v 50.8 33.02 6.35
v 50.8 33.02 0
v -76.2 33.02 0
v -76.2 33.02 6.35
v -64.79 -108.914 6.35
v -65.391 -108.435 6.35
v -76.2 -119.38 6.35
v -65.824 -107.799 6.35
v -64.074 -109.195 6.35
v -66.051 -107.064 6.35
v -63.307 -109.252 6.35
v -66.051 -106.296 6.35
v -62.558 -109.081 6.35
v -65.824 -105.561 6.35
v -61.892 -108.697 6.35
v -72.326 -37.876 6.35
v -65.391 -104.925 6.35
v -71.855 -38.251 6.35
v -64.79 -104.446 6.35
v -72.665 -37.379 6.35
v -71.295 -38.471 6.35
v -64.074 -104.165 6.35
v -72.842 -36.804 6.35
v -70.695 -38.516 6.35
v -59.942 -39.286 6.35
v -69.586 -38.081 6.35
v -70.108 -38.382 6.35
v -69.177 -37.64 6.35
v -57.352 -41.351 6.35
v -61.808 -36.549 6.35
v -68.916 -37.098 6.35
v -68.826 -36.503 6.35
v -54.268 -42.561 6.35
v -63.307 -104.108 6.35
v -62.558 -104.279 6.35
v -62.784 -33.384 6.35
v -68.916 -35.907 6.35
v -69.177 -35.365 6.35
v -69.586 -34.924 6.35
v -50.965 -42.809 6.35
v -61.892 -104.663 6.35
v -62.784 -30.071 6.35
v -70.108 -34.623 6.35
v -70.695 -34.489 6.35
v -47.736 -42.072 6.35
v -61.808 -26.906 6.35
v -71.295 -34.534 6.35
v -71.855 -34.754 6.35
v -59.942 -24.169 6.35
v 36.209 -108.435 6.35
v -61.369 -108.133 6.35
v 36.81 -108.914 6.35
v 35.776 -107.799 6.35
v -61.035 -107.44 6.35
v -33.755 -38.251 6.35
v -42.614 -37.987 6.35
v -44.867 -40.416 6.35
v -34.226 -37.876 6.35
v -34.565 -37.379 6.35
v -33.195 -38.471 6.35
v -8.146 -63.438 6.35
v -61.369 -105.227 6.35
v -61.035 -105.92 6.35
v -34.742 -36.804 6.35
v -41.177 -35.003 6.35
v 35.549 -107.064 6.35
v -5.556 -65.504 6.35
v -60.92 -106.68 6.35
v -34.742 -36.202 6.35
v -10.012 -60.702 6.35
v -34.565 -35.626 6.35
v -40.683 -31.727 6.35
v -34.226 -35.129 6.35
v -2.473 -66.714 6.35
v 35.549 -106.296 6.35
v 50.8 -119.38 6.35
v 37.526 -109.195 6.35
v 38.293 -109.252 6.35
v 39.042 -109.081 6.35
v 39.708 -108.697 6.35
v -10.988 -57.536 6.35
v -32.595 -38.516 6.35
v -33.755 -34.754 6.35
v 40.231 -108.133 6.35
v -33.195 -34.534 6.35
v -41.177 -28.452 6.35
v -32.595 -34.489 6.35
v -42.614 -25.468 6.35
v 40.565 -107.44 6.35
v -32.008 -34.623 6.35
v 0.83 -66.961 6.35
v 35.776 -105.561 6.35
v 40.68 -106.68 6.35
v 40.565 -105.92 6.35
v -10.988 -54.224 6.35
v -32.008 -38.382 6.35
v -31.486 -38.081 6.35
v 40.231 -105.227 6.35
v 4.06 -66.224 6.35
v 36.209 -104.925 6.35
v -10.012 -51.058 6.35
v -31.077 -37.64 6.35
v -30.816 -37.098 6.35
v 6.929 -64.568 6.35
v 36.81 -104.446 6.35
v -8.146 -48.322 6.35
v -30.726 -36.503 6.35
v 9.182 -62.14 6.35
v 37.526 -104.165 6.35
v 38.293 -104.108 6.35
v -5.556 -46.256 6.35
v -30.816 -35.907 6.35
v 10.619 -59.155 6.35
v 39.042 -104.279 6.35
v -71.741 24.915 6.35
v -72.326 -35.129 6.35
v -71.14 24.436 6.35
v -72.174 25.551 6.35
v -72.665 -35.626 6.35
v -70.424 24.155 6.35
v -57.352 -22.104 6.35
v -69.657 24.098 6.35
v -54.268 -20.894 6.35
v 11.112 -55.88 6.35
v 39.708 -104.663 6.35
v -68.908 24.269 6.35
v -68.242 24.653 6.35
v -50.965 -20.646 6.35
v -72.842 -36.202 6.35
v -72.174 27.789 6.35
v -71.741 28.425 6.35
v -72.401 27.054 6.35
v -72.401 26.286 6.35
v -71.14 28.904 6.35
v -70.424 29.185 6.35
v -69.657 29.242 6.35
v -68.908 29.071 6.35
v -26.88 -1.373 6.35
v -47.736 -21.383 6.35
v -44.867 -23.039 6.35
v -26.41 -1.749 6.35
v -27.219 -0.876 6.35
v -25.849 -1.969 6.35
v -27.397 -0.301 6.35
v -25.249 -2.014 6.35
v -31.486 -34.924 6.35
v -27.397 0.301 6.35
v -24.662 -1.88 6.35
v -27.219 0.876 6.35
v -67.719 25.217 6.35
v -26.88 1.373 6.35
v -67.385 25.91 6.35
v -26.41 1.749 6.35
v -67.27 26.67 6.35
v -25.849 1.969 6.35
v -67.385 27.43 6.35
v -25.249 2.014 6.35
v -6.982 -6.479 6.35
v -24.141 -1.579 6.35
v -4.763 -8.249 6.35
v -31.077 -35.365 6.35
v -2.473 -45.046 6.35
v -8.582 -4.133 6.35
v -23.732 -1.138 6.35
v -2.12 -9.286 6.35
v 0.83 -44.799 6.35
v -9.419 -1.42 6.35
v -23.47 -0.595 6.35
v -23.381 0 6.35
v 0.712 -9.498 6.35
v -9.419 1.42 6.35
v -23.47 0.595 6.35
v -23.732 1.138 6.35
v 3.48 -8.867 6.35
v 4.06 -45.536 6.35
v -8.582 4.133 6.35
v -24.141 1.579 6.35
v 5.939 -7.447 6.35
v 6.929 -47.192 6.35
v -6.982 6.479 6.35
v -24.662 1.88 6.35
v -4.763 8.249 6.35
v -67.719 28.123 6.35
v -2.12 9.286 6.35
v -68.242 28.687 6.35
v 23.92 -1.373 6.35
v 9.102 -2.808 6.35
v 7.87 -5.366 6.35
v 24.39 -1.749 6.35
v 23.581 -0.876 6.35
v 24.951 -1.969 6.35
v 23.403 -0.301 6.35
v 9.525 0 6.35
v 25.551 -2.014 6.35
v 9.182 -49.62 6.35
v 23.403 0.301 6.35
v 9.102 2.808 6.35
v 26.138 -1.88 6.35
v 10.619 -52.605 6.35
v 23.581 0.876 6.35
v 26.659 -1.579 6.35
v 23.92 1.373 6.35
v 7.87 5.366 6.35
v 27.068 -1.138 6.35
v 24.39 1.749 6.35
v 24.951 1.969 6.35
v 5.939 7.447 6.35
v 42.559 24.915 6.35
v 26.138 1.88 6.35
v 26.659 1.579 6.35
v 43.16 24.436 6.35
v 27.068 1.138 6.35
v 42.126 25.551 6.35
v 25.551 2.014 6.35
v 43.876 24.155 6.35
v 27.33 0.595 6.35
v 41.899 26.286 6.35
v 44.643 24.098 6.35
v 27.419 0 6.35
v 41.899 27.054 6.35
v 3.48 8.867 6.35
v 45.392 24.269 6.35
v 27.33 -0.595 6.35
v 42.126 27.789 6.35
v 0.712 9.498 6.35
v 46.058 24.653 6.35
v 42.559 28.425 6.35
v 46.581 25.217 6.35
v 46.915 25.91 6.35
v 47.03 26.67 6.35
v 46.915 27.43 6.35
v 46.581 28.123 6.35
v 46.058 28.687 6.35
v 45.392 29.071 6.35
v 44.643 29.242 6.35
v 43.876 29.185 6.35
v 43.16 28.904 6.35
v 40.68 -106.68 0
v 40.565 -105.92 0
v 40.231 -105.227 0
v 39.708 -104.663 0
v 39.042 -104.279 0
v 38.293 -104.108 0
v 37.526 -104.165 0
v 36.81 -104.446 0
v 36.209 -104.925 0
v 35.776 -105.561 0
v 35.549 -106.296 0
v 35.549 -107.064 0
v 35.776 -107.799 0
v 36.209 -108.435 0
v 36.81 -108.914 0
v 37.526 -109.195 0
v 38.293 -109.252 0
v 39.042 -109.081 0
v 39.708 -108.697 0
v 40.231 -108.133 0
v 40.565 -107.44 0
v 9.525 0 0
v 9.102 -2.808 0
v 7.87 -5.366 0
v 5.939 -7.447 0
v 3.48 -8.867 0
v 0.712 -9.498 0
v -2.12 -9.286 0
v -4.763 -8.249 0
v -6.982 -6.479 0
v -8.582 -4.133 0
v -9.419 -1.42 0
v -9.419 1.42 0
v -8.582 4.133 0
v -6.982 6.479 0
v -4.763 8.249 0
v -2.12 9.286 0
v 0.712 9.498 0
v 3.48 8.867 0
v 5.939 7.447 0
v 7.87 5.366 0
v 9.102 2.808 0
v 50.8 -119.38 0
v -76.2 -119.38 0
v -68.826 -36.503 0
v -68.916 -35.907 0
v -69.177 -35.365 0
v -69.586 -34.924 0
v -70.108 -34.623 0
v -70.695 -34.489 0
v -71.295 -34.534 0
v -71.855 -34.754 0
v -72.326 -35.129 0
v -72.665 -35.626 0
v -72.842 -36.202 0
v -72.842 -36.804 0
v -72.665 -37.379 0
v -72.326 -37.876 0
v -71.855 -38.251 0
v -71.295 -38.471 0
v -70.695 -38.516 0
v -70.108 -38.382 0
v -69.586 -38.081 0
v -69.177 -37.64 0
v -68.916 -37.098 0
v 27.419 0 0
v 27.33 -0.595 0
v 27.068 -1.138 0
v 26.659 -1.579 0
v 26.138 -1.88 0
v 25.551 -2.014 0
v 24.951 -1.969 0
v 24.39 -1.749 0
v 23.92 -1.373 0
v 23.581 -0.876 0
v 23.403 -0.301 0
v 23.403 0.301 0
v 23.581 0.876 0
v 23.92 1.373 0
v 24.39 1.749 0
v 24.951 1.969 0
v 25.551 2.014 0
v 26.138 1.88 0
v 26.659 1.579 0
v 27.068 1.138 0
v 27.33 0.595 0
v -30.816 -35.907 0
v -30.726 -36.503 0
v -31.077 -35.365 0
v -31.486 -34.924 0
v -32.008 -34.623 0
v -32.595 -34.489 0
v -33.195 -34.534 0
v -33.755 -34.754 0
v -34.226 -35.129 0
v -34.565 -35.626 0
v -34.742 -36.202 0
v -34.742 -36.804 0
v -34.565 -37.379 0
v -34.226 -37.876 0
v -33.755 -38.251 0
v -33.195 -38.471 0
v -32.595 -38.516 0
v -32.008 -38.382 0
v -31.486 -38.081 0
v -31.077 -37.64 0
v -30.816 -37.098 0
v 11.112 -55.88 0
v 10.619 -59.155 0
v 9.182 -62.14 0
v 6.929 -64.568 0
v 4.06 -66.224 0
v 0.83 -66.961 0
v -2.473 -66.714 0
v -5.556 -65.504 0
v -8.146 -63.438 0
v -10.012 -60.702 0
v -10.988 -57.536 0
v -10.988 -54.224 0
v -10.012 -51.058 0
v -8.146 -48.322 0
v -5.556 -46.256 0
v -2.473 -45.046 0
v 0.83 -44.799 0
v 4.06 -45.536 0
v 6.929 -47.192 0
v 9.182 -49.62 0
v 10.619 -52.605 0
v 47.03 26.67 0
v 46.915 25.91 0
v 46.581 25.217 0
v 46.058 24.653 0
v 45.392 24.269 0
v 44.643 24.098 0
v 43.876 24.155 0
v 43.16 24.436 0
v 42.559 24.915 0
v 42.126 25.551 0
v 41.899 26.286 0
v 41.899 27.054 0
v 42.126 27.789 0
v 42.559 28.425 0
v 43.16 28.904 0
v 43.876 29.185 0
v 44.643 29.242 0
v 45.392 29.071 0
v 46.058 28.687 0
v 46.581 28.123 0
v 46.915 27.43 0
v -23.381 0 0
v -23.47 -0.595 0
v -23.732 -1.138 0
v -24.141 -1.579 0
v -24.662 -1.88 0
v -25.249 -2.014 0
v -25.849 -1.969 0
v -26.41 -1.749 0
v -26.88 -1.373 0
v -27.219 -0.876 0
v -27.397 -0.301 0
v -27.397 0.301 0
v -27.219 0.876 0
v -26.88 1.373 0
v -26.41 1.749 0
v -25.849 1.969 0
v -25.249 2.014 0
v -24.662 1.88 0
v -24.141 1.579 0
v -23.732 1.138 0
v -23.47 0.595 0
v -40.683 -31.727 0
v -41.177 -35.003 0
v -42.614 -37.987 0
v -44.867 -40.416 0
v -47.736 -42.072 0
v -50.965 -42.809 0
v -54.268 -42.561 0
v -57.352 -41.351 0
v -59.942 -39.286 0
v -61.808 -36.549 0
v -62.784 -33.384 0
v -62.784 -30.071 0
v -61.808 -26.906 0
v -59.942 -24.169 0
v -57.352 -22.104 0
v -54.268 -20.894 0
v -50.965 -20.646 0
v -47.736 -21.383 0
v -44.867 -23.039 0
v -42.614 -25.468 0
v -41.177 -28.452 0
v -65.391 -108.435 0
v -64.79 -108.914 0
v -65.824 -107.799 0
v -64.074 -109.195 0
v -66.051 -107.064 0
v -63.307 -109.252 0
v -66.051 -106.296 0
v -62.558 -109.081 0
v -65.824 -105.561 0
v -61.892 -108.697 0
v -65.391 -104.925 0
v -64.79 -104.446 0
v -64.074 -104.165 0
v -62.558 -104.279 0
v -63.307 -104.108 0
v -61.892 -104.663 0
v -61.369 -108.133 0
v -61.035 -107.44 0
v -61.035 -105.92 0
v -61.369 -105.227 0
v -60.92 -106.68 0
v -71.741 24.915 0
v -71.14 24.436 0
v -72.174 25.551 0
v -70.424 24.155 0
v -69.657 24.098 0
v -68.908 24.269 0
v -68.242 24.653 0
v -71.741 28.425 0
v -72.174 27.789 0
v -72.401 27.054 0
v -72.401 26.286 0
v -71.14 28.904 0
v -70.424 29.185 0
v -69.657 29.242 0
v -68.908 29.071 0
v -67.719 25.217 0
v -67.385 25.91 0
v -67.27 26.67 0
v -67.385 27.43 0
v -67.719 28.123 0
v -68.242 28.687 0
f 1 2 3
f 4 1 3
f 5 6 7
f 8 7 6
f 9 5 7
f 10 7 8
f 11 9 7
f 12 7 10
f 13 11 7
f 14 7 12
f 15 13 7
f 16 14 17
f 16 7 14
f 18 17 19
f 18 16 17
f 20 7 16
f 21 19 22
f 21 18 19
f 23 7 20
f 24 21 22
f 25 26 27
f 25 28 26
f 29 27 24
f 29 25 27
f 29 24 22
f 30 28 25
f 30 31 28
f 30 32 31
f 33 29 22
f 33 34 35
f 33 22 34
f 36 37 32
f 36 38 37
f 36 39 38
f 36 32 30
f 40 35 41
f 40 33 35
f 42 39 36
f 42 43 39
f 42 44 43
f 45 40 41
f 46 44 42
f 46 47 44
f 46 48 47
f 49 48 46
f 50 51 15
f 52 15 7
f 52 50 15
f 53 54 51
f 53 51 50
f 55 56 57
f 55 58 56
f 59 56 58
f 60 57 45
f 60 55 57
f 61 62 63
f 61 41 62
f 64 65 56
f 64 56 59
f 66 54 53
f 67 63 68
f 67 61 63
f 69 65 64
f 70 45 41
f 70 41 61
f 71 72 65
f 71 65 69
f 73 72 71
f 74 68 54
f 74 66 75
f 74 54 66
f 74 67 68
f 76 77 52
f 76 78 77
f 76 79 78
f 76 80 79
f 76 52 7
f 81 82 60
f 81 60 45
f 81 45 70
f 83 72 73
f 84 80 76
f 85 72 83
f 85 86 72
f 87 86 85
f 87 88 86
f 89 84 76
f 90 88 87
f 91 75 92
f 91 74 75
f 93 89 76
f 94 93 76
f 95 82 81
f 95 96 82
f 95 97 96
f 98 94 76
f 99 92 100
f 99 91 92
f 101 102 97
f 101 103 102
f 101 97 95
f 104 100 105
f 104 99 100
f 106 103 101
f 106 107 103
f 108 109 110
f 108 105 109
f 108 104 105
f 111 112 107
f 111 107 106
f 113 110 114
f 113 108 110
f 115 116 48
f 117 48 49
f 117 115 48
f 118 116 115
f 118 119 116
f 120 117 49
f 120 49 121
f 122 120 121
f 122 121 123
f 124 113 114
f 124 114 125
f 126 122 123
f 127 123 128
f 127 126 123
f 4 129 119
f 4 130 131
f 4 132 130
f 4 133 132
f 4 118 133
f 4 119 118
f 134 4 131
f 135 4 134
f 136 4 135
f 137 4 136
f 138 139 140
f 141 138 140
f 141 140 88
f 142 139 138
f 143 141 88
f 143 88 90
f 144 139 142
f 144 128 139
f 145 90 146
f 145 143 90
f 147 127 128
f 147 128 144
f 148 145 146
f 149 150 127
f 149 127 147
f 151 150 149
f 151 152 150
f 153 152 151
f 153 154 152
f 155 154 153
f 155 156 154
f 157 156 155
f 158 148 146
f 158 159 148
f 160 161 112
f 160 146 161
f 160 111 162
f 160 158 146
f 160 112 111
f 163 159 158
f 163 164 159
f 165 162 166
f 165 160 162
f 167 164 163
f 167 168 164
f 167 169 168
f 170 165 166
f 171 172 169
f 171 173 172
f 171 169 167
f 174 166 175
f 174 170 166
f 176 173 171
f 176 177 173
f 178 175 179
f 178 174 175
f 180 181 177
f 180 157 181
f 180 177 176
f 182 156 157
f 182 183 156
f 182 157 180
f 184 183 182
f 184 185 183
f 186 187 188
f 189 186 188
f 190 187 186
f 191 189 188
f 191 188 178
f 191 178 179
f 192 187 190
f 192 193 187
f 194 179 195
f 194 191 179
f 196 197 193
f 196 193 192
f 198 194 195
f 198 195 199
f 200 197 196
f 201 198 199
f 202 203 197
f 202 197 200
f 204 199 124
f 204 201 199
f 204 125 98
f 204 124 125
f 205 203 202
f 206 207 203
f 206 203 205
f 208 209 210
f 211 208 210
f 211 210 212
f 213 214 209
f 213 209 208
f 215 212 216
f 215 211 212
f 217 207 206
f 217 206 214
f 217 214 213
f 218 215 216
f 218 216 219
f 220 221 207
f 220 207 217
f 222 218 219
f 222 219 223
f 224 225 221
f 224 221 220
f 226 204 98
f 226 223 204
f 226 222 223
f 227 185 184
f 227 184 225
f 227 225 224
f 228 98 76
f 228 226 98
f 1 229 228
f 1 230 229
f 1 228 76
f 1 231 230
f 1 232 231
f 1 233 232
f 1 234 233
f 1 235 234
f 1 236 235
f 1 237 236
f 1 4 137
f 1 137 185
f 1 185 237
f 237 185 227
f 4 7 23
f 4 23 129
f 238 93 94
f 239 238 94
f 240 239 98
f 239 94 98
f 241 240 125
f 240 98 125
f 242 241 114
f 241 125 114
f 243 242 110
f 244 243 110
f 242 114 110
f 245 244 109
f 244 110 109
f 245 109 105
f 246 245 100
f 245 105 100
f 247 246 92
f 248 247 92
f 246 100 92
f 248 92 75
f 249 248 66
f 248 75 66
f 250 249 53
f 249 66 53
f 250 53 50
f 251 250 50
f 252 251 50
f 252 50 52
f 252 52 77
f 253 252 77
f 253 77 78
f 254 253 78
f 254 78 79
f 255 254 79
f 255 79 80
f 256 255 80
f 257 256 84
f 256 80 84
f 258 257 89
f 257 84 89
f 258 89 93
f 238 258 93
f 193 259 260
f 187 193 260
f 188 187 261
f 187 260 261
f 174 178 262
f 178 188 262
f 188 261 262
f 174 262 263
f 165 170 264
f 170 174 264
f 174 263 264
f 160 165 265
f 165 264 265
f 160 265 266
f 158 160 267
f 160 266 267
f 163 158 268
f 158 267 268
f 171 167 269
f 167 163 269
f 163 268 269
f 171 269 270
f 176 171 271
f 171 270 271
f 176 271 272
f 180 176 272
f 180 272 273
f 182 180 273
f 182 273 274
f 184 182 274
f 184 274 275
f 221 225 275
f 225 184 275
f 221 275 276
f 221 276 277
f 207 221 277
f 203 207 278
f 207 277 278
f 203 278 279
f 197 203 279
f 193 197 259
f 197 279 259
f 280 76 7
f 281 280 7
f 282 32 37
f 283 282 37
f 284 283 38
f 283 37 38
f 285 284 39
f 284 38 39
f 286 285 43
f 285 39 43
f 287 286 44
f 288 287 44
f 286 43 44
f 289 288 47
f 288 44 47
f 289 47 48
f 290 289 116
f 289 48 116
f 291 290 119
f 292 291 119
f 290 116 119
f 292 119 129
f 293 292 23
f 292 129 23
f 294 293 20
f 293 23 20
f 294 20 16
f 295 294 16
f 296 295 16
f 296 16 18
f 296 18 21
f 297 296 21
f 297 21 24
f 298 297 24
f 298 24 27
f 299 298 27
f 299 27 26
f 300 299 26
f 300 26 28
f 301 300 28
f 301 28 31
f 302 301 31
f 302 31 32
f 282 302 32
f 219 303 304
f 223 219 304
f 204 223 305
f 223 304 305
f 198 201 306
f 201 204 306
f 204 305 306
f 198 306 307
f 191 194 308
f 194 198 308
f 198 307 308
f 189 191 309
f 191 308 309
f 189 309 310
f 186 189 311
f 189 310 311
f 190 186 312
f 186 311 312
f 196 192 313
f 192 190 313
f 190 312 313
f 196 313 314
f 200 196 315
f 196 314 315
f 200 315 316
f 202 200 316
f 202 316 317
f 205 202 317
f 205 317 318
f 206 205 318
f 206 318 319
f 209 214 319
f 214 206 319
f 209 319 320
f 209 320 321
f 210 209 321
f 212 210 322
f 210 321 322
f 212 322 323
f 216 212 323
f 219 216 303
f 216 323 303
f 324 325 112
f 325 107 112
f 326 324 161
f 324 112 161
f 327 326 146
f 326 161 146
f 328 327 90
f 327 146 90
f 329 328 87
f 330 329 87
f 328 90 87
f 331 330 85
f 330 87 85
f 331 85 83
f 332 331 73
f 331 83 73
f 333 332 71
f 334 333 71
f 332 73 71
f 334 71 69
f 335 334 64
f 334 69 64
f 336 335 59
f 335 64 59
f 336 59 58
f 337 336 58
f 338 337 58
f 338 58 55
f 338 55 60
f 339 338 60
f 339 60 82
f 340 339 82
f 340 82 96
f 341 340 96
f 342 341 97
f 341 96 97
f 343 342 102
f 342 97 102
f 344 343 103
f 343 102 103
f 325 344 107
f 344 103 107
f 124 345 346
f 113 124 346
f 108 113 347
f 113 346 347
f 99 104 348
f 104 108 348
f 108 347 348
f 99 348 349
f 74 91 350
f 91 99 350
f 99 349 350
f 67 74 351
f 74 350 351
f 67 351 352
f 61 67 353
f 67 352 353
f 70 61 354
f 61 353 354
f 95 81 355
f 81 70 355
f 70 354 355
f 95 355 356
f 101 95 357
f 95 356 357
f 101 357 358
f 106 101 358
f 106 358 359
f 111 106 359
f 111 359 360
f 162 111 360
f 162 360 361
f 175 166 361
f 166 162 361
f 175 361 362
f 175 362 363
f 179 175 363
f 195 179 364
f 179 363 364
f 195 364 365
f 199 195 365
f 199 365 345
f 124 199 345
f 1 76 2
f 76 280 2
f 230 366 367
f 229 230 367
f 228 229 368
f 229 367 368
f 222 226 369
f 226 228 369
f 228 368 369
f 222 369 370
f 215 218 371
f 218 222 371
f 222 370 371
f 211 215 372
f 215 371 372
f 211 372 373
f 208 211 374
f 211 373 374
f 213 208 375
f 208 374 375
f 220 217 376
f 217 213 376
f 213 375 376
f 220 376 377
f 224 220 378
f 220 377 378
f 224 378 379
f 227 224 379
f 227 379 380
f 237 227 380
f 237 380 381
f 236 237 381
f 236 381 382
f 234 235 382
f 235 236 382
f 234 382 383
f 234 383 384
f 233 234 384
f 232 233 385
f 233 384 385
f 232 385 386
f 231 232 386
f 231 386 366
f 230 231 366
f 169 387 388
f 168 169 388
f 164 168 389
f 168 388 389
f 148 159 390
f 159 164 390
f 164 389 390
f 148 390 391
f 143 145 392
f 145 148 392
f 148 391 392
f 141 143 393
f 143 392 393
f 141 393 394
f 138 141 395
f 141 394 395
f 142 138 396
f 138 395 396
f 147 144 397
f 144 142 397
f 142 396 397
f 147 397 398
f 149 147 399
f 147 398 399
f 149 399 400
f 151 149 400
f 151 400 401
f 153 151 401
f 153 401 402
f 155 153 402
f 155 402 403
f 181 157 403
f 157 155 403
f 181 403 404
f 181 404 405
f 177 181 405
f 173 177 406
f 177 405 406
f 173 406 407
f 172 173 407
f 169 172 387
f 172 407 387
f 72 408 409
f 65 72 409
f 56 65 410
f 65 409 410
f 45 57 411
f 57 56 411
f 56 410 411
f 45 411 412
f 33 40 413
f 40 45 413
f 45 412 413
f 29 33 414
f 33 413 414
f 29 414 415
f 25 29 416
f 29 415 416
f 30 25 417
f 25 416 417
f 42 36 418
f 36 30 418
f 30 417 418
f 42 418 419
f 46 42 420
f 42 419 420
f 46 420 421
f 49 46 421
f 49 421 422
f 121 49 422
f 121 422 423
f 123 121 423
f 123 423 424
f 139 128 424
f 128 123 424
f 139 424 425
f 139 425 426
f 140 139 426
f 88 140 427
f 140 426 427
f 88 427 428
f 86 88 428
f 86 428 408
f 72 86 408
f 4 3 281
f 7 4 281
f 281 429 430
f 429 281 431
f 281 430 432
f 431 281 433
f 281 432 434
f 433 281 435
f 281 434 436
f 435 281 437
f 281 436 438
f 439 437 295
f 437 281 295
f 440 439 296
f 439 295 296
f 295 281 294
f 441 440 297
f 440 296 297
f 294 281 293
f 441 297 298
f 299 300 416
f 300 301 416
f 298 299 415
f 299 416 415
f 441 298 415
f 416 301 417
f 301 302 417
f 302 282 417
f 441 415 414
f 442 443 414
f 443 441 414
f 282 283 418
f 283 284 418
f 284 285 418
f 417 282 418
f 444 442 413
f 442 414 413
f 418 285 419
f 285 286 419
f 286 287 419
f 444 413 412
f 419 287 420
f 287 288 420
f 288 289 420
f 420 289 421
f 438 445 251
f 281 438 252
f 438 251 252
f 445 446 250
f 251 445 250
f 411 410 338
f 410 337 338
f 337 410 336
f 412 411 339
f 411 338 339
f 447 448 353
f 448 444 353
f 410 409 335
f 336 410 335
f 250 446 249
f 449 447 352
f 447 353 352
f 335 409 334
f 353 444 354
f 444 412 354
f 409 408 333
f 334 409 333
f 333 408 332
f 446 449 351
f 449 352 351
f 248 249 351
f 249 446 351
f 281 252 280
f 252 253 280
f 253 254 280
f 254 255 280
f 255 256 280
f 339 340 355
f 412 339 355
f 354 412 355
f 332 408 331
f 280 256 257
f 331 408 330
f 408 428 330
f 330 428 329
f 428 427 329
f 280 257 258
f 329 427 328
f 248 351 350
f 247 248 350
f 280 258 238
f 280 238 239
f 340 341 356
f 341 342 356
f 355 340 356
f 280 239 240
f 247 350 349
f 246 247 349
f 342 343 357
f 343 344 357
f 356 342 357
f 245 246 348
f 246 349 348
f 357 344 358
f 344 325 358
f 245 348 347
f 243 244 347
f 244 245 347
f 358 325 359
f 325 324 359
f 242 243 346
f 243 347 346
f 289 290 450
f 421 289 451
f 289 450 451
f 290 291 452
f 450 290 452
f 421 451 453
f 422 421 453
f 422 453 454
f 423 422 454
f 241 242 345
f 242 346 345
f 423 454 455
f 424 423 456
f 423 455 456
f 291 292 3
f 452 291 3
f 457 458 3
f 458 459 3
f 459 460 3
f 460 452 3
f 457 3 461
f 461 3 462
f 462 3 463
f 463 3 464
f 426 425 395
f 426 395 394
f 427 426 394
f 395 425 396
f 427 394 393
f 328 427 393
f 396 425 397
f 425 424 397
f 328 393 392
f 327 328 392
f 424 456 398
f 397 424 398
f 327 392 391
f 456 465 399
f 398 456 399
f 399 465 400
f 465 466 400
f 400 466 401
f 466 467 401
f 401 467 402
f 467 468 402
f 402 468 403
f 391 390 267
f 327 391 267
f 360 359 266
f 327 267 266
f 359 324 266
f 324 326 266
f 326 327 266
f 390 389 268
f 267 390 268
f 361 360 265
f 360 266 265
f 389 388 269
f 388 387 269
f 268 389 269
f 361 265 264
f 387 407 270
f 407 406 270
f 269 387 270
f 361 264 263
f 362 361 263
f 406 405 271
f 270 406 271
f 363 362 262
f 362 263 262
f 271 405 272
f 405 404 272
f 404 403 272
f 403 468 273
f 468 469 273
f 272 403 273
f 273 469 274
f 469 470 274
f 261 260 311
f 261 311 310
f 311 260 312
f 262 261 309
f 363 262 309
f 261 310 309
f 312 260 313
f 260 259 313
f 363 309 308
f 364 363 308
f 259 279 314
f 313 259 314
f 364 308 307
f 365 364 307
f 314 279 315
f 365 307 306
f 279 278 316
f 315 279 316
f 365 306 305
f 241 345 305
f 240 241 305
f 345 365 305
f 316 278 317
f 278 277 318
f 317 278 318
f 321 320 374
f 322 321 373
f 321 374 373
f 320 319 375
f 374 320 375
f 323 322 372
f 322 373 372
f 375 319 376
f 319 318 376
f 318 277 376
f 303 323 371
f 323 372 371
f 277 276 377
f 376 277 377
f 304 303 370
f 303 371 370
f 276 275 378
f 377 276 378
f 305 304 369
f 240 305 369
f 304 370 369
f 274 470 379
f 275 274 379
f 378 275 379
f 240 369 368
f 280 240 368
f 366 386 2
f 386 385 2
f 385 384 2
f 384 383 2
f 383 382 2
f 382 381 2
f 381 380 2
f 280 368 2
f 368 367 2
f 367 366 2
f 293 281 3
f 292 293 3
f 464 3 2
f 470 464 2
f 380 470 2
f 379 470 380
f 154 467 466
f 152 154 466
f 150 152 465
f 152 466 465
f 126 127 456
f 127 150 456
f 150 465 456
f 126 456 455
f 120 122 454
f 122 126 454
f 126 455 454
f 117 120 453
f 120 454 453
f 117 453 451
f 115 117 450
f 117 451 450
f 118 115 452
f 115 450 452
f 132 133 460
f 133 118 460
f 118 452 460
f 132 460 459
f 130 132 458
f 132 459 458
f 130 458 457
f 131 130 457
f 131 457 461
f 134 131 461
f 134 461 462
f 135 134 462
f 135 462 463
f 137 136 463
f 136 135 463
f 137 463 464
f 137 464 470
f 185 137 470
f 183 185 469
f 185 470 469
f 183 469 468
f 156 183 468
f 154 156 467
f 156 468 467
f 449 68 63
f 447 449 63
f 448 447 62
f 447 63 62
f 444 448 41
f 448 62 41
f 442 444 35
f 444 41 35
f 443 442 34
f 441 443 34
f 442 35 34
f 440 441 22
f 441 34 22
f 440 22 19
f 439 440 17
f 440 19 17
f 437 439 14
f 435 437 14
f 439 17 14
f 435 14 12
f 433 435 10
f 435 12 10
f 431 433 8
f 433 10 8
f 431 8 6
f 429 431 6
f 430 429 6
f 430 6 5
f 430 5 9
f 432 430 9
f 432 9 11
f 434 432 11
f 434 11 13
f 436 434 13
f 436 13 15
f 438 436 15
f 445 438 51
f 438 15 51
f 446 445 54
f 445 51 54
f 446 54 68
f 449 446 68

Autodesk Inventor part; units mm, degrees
ref_plane "YZ Plane" through (0, 0, 0) normal (1, 0, 0) x (0, 1, 0)
ref_plane "XZ Plane" through (0, 0, 0) normal (0, 1, 0) x (-1, 0, 0)
ref_plane "XY Plane" through (0, 0, 0) normal (0, 0, 1) x (1, 0, 0)
sketch "Sketch1" plane through (0, 0, 0) normal (0, 0, 1) x (1, 0, 0)
  circle A0 centre (0, 0) radius 9.525
  line L0 (0, 0) -> (25.4, 0) construction
  line L1 (25.4, 0) -> (-25.4, 0) construction
  line L2 (0, 0) -> (0, -55.88) construction
  line L3 (0, -55.88) -> (-51.7955, -31.7274) construction
  circle A1 centre (0, -55.88) radius 11.1125
  circle A2 centre (-51.7955, -31.7274) radius 11.1125
  line L4 (0, -55.88) -> (0, -106.68) construction
  line L5 (0, -106.68) -> (50.8, -106.68)
  line L6 (50.8, -106.68) -> (50.8, 33.02)
  line L7 (-51.7955, -31.7274) -> (-98.7855, -31.7274) construction
  line L8 (50.8, 33.02) -> (-76.2, 33.02)
  line L9 (-76.2, 33.02) -> (-76.2, -106.68)
  line L10 (-76.2, -106.68) -> (0, -106.68)
  circle A3 centre (25.4, 0) radius 2.0193
  circle A4 centre (-25.4, 0) radius 2.0193
  line L11 (-76.2, 33.02) -> (-69.85, 33.02) construction
  line L12 (-69.85, 33.02) -> (-69.85, 26.67) construction
  circle A5 centre (-69.85, 26.67) radius 2.5797
  line L13 (-12.7, 33.02) -> (-12.7, -106.68) construction
  line L14 (50.8, -36.83) -> (-76.2, -36.83) construction
  circle A6 centre (44.45, 26.67) radius 2.5797
  dimension "d0" = 19.05
  dimension "d1" = 25.4
  dimension "d2" = 50.8
  dimension "d3" = 55.88
  dimension "d4" = 57.15
  dimension "d5" = 65
  dimension "d6" = 22.225
  dimension "d7" = 22.225
  dimension "d8" = 50.8
  dimension "d9" = 50.8
  dimension "d10" = 139.7
  dimension "d11" = 46.99
  dimension "d12" = 127
  dimension "d13" = 4.0386
  dimension "d14" = 6.35
  dimension "d15" = 6.35
  dimension "d16" = 5.1594
extrude "Extrusion1" add sketch "Sketch1" along normal blind 6.35
sketch "Sketch2" plane through (0, 0, 6.35) normal (0, 0, 1) x (1, 0, 0)
  line L0 (-76.2, -106.68) -> (50.8, -106.68) projected
  line L1 (-76.2, -106.68) -> (50.8, -106.68)
  line L2 (50.8, -106.68) -> (50.8, -119.38)
  line L3 (50.8, -119.38) -> (-76.2, -119.38)
  line L4 (-76.2, -119.38) -> (-76.2, -106.68)
  point P0 (0, 0)
  dimension "d19" = 127
  dimension "d20" = 12.7
extrude "Extrusion2" add sketch "Sketch2" against normal blind 6.35
sketch "Sketch3" plane through (0, 0, 6.35) normal (0, 0, 1) x (1, 0, 0)
  line L0 (50.8, 33.02) -> (50.8, -119.38) projected
  line L1 (50.8, -119.38) -> (38.1, -119.38) construction
  line L2 (50.8, -119.38) -> (-76.2, -119.38) projected
  line L3 (38.1, -119.38) -> (38.1, -106.68) construction
  line L4 (-12.7, -119.38) -> (-12.7, -74.0857) construction
  circle A0 centre (38.1, -106.68) radius 2.5797
  circle A1 centre (-63.5, -106.68) radius 2.5797
  point P0 (0, 0)
  dimension "d23" = 12.7
  dimension "d24" = 12.7
  dimension "d25" = 5.1594
extrude "Extrusion3" cut sketch "Sketch3" against normal blind 6.35
sketch "Sketch4" plane through (0, 0, 6.35) normal (0, 0, 1) x (1, 0, 0)
  circle A0 centre (-51.7955, -31.7274) radius 11.1125 projected
  circle A1 centre (-51.7955, -31.7274) radius 11.1125
  line L0 (-51.7955, -31.7274) -> (-70.8455, -31.7274) construction
  line L1 (-70.8455, -31.7274) -> (-32.7455, -31.7274) construction
  line L2 (-32.7455, -31.7274) -> (-32.7455, -36.5026) construction
  line L3 (-51.7955, -31.7274) -> (-51.7955, -49.632) construction
  circle A2 centre (-32.7455, -36.5026) radius 2.0193
  circle A3 centre (-70.8455, -36.5026) radius 2.0193
  point P0 (0, 0)
  dimension "d28" = 19.05
  dimension "d29" = 38.1
  dimension "d30" = 4.7752
  dimension "d31" = 4.0386
extrude "Extrusion4" cut sketch "Sketch4" against normal blind 6.35 contours A2 | A3
properties part number "Rack and Pinion Gearbox Plate"
